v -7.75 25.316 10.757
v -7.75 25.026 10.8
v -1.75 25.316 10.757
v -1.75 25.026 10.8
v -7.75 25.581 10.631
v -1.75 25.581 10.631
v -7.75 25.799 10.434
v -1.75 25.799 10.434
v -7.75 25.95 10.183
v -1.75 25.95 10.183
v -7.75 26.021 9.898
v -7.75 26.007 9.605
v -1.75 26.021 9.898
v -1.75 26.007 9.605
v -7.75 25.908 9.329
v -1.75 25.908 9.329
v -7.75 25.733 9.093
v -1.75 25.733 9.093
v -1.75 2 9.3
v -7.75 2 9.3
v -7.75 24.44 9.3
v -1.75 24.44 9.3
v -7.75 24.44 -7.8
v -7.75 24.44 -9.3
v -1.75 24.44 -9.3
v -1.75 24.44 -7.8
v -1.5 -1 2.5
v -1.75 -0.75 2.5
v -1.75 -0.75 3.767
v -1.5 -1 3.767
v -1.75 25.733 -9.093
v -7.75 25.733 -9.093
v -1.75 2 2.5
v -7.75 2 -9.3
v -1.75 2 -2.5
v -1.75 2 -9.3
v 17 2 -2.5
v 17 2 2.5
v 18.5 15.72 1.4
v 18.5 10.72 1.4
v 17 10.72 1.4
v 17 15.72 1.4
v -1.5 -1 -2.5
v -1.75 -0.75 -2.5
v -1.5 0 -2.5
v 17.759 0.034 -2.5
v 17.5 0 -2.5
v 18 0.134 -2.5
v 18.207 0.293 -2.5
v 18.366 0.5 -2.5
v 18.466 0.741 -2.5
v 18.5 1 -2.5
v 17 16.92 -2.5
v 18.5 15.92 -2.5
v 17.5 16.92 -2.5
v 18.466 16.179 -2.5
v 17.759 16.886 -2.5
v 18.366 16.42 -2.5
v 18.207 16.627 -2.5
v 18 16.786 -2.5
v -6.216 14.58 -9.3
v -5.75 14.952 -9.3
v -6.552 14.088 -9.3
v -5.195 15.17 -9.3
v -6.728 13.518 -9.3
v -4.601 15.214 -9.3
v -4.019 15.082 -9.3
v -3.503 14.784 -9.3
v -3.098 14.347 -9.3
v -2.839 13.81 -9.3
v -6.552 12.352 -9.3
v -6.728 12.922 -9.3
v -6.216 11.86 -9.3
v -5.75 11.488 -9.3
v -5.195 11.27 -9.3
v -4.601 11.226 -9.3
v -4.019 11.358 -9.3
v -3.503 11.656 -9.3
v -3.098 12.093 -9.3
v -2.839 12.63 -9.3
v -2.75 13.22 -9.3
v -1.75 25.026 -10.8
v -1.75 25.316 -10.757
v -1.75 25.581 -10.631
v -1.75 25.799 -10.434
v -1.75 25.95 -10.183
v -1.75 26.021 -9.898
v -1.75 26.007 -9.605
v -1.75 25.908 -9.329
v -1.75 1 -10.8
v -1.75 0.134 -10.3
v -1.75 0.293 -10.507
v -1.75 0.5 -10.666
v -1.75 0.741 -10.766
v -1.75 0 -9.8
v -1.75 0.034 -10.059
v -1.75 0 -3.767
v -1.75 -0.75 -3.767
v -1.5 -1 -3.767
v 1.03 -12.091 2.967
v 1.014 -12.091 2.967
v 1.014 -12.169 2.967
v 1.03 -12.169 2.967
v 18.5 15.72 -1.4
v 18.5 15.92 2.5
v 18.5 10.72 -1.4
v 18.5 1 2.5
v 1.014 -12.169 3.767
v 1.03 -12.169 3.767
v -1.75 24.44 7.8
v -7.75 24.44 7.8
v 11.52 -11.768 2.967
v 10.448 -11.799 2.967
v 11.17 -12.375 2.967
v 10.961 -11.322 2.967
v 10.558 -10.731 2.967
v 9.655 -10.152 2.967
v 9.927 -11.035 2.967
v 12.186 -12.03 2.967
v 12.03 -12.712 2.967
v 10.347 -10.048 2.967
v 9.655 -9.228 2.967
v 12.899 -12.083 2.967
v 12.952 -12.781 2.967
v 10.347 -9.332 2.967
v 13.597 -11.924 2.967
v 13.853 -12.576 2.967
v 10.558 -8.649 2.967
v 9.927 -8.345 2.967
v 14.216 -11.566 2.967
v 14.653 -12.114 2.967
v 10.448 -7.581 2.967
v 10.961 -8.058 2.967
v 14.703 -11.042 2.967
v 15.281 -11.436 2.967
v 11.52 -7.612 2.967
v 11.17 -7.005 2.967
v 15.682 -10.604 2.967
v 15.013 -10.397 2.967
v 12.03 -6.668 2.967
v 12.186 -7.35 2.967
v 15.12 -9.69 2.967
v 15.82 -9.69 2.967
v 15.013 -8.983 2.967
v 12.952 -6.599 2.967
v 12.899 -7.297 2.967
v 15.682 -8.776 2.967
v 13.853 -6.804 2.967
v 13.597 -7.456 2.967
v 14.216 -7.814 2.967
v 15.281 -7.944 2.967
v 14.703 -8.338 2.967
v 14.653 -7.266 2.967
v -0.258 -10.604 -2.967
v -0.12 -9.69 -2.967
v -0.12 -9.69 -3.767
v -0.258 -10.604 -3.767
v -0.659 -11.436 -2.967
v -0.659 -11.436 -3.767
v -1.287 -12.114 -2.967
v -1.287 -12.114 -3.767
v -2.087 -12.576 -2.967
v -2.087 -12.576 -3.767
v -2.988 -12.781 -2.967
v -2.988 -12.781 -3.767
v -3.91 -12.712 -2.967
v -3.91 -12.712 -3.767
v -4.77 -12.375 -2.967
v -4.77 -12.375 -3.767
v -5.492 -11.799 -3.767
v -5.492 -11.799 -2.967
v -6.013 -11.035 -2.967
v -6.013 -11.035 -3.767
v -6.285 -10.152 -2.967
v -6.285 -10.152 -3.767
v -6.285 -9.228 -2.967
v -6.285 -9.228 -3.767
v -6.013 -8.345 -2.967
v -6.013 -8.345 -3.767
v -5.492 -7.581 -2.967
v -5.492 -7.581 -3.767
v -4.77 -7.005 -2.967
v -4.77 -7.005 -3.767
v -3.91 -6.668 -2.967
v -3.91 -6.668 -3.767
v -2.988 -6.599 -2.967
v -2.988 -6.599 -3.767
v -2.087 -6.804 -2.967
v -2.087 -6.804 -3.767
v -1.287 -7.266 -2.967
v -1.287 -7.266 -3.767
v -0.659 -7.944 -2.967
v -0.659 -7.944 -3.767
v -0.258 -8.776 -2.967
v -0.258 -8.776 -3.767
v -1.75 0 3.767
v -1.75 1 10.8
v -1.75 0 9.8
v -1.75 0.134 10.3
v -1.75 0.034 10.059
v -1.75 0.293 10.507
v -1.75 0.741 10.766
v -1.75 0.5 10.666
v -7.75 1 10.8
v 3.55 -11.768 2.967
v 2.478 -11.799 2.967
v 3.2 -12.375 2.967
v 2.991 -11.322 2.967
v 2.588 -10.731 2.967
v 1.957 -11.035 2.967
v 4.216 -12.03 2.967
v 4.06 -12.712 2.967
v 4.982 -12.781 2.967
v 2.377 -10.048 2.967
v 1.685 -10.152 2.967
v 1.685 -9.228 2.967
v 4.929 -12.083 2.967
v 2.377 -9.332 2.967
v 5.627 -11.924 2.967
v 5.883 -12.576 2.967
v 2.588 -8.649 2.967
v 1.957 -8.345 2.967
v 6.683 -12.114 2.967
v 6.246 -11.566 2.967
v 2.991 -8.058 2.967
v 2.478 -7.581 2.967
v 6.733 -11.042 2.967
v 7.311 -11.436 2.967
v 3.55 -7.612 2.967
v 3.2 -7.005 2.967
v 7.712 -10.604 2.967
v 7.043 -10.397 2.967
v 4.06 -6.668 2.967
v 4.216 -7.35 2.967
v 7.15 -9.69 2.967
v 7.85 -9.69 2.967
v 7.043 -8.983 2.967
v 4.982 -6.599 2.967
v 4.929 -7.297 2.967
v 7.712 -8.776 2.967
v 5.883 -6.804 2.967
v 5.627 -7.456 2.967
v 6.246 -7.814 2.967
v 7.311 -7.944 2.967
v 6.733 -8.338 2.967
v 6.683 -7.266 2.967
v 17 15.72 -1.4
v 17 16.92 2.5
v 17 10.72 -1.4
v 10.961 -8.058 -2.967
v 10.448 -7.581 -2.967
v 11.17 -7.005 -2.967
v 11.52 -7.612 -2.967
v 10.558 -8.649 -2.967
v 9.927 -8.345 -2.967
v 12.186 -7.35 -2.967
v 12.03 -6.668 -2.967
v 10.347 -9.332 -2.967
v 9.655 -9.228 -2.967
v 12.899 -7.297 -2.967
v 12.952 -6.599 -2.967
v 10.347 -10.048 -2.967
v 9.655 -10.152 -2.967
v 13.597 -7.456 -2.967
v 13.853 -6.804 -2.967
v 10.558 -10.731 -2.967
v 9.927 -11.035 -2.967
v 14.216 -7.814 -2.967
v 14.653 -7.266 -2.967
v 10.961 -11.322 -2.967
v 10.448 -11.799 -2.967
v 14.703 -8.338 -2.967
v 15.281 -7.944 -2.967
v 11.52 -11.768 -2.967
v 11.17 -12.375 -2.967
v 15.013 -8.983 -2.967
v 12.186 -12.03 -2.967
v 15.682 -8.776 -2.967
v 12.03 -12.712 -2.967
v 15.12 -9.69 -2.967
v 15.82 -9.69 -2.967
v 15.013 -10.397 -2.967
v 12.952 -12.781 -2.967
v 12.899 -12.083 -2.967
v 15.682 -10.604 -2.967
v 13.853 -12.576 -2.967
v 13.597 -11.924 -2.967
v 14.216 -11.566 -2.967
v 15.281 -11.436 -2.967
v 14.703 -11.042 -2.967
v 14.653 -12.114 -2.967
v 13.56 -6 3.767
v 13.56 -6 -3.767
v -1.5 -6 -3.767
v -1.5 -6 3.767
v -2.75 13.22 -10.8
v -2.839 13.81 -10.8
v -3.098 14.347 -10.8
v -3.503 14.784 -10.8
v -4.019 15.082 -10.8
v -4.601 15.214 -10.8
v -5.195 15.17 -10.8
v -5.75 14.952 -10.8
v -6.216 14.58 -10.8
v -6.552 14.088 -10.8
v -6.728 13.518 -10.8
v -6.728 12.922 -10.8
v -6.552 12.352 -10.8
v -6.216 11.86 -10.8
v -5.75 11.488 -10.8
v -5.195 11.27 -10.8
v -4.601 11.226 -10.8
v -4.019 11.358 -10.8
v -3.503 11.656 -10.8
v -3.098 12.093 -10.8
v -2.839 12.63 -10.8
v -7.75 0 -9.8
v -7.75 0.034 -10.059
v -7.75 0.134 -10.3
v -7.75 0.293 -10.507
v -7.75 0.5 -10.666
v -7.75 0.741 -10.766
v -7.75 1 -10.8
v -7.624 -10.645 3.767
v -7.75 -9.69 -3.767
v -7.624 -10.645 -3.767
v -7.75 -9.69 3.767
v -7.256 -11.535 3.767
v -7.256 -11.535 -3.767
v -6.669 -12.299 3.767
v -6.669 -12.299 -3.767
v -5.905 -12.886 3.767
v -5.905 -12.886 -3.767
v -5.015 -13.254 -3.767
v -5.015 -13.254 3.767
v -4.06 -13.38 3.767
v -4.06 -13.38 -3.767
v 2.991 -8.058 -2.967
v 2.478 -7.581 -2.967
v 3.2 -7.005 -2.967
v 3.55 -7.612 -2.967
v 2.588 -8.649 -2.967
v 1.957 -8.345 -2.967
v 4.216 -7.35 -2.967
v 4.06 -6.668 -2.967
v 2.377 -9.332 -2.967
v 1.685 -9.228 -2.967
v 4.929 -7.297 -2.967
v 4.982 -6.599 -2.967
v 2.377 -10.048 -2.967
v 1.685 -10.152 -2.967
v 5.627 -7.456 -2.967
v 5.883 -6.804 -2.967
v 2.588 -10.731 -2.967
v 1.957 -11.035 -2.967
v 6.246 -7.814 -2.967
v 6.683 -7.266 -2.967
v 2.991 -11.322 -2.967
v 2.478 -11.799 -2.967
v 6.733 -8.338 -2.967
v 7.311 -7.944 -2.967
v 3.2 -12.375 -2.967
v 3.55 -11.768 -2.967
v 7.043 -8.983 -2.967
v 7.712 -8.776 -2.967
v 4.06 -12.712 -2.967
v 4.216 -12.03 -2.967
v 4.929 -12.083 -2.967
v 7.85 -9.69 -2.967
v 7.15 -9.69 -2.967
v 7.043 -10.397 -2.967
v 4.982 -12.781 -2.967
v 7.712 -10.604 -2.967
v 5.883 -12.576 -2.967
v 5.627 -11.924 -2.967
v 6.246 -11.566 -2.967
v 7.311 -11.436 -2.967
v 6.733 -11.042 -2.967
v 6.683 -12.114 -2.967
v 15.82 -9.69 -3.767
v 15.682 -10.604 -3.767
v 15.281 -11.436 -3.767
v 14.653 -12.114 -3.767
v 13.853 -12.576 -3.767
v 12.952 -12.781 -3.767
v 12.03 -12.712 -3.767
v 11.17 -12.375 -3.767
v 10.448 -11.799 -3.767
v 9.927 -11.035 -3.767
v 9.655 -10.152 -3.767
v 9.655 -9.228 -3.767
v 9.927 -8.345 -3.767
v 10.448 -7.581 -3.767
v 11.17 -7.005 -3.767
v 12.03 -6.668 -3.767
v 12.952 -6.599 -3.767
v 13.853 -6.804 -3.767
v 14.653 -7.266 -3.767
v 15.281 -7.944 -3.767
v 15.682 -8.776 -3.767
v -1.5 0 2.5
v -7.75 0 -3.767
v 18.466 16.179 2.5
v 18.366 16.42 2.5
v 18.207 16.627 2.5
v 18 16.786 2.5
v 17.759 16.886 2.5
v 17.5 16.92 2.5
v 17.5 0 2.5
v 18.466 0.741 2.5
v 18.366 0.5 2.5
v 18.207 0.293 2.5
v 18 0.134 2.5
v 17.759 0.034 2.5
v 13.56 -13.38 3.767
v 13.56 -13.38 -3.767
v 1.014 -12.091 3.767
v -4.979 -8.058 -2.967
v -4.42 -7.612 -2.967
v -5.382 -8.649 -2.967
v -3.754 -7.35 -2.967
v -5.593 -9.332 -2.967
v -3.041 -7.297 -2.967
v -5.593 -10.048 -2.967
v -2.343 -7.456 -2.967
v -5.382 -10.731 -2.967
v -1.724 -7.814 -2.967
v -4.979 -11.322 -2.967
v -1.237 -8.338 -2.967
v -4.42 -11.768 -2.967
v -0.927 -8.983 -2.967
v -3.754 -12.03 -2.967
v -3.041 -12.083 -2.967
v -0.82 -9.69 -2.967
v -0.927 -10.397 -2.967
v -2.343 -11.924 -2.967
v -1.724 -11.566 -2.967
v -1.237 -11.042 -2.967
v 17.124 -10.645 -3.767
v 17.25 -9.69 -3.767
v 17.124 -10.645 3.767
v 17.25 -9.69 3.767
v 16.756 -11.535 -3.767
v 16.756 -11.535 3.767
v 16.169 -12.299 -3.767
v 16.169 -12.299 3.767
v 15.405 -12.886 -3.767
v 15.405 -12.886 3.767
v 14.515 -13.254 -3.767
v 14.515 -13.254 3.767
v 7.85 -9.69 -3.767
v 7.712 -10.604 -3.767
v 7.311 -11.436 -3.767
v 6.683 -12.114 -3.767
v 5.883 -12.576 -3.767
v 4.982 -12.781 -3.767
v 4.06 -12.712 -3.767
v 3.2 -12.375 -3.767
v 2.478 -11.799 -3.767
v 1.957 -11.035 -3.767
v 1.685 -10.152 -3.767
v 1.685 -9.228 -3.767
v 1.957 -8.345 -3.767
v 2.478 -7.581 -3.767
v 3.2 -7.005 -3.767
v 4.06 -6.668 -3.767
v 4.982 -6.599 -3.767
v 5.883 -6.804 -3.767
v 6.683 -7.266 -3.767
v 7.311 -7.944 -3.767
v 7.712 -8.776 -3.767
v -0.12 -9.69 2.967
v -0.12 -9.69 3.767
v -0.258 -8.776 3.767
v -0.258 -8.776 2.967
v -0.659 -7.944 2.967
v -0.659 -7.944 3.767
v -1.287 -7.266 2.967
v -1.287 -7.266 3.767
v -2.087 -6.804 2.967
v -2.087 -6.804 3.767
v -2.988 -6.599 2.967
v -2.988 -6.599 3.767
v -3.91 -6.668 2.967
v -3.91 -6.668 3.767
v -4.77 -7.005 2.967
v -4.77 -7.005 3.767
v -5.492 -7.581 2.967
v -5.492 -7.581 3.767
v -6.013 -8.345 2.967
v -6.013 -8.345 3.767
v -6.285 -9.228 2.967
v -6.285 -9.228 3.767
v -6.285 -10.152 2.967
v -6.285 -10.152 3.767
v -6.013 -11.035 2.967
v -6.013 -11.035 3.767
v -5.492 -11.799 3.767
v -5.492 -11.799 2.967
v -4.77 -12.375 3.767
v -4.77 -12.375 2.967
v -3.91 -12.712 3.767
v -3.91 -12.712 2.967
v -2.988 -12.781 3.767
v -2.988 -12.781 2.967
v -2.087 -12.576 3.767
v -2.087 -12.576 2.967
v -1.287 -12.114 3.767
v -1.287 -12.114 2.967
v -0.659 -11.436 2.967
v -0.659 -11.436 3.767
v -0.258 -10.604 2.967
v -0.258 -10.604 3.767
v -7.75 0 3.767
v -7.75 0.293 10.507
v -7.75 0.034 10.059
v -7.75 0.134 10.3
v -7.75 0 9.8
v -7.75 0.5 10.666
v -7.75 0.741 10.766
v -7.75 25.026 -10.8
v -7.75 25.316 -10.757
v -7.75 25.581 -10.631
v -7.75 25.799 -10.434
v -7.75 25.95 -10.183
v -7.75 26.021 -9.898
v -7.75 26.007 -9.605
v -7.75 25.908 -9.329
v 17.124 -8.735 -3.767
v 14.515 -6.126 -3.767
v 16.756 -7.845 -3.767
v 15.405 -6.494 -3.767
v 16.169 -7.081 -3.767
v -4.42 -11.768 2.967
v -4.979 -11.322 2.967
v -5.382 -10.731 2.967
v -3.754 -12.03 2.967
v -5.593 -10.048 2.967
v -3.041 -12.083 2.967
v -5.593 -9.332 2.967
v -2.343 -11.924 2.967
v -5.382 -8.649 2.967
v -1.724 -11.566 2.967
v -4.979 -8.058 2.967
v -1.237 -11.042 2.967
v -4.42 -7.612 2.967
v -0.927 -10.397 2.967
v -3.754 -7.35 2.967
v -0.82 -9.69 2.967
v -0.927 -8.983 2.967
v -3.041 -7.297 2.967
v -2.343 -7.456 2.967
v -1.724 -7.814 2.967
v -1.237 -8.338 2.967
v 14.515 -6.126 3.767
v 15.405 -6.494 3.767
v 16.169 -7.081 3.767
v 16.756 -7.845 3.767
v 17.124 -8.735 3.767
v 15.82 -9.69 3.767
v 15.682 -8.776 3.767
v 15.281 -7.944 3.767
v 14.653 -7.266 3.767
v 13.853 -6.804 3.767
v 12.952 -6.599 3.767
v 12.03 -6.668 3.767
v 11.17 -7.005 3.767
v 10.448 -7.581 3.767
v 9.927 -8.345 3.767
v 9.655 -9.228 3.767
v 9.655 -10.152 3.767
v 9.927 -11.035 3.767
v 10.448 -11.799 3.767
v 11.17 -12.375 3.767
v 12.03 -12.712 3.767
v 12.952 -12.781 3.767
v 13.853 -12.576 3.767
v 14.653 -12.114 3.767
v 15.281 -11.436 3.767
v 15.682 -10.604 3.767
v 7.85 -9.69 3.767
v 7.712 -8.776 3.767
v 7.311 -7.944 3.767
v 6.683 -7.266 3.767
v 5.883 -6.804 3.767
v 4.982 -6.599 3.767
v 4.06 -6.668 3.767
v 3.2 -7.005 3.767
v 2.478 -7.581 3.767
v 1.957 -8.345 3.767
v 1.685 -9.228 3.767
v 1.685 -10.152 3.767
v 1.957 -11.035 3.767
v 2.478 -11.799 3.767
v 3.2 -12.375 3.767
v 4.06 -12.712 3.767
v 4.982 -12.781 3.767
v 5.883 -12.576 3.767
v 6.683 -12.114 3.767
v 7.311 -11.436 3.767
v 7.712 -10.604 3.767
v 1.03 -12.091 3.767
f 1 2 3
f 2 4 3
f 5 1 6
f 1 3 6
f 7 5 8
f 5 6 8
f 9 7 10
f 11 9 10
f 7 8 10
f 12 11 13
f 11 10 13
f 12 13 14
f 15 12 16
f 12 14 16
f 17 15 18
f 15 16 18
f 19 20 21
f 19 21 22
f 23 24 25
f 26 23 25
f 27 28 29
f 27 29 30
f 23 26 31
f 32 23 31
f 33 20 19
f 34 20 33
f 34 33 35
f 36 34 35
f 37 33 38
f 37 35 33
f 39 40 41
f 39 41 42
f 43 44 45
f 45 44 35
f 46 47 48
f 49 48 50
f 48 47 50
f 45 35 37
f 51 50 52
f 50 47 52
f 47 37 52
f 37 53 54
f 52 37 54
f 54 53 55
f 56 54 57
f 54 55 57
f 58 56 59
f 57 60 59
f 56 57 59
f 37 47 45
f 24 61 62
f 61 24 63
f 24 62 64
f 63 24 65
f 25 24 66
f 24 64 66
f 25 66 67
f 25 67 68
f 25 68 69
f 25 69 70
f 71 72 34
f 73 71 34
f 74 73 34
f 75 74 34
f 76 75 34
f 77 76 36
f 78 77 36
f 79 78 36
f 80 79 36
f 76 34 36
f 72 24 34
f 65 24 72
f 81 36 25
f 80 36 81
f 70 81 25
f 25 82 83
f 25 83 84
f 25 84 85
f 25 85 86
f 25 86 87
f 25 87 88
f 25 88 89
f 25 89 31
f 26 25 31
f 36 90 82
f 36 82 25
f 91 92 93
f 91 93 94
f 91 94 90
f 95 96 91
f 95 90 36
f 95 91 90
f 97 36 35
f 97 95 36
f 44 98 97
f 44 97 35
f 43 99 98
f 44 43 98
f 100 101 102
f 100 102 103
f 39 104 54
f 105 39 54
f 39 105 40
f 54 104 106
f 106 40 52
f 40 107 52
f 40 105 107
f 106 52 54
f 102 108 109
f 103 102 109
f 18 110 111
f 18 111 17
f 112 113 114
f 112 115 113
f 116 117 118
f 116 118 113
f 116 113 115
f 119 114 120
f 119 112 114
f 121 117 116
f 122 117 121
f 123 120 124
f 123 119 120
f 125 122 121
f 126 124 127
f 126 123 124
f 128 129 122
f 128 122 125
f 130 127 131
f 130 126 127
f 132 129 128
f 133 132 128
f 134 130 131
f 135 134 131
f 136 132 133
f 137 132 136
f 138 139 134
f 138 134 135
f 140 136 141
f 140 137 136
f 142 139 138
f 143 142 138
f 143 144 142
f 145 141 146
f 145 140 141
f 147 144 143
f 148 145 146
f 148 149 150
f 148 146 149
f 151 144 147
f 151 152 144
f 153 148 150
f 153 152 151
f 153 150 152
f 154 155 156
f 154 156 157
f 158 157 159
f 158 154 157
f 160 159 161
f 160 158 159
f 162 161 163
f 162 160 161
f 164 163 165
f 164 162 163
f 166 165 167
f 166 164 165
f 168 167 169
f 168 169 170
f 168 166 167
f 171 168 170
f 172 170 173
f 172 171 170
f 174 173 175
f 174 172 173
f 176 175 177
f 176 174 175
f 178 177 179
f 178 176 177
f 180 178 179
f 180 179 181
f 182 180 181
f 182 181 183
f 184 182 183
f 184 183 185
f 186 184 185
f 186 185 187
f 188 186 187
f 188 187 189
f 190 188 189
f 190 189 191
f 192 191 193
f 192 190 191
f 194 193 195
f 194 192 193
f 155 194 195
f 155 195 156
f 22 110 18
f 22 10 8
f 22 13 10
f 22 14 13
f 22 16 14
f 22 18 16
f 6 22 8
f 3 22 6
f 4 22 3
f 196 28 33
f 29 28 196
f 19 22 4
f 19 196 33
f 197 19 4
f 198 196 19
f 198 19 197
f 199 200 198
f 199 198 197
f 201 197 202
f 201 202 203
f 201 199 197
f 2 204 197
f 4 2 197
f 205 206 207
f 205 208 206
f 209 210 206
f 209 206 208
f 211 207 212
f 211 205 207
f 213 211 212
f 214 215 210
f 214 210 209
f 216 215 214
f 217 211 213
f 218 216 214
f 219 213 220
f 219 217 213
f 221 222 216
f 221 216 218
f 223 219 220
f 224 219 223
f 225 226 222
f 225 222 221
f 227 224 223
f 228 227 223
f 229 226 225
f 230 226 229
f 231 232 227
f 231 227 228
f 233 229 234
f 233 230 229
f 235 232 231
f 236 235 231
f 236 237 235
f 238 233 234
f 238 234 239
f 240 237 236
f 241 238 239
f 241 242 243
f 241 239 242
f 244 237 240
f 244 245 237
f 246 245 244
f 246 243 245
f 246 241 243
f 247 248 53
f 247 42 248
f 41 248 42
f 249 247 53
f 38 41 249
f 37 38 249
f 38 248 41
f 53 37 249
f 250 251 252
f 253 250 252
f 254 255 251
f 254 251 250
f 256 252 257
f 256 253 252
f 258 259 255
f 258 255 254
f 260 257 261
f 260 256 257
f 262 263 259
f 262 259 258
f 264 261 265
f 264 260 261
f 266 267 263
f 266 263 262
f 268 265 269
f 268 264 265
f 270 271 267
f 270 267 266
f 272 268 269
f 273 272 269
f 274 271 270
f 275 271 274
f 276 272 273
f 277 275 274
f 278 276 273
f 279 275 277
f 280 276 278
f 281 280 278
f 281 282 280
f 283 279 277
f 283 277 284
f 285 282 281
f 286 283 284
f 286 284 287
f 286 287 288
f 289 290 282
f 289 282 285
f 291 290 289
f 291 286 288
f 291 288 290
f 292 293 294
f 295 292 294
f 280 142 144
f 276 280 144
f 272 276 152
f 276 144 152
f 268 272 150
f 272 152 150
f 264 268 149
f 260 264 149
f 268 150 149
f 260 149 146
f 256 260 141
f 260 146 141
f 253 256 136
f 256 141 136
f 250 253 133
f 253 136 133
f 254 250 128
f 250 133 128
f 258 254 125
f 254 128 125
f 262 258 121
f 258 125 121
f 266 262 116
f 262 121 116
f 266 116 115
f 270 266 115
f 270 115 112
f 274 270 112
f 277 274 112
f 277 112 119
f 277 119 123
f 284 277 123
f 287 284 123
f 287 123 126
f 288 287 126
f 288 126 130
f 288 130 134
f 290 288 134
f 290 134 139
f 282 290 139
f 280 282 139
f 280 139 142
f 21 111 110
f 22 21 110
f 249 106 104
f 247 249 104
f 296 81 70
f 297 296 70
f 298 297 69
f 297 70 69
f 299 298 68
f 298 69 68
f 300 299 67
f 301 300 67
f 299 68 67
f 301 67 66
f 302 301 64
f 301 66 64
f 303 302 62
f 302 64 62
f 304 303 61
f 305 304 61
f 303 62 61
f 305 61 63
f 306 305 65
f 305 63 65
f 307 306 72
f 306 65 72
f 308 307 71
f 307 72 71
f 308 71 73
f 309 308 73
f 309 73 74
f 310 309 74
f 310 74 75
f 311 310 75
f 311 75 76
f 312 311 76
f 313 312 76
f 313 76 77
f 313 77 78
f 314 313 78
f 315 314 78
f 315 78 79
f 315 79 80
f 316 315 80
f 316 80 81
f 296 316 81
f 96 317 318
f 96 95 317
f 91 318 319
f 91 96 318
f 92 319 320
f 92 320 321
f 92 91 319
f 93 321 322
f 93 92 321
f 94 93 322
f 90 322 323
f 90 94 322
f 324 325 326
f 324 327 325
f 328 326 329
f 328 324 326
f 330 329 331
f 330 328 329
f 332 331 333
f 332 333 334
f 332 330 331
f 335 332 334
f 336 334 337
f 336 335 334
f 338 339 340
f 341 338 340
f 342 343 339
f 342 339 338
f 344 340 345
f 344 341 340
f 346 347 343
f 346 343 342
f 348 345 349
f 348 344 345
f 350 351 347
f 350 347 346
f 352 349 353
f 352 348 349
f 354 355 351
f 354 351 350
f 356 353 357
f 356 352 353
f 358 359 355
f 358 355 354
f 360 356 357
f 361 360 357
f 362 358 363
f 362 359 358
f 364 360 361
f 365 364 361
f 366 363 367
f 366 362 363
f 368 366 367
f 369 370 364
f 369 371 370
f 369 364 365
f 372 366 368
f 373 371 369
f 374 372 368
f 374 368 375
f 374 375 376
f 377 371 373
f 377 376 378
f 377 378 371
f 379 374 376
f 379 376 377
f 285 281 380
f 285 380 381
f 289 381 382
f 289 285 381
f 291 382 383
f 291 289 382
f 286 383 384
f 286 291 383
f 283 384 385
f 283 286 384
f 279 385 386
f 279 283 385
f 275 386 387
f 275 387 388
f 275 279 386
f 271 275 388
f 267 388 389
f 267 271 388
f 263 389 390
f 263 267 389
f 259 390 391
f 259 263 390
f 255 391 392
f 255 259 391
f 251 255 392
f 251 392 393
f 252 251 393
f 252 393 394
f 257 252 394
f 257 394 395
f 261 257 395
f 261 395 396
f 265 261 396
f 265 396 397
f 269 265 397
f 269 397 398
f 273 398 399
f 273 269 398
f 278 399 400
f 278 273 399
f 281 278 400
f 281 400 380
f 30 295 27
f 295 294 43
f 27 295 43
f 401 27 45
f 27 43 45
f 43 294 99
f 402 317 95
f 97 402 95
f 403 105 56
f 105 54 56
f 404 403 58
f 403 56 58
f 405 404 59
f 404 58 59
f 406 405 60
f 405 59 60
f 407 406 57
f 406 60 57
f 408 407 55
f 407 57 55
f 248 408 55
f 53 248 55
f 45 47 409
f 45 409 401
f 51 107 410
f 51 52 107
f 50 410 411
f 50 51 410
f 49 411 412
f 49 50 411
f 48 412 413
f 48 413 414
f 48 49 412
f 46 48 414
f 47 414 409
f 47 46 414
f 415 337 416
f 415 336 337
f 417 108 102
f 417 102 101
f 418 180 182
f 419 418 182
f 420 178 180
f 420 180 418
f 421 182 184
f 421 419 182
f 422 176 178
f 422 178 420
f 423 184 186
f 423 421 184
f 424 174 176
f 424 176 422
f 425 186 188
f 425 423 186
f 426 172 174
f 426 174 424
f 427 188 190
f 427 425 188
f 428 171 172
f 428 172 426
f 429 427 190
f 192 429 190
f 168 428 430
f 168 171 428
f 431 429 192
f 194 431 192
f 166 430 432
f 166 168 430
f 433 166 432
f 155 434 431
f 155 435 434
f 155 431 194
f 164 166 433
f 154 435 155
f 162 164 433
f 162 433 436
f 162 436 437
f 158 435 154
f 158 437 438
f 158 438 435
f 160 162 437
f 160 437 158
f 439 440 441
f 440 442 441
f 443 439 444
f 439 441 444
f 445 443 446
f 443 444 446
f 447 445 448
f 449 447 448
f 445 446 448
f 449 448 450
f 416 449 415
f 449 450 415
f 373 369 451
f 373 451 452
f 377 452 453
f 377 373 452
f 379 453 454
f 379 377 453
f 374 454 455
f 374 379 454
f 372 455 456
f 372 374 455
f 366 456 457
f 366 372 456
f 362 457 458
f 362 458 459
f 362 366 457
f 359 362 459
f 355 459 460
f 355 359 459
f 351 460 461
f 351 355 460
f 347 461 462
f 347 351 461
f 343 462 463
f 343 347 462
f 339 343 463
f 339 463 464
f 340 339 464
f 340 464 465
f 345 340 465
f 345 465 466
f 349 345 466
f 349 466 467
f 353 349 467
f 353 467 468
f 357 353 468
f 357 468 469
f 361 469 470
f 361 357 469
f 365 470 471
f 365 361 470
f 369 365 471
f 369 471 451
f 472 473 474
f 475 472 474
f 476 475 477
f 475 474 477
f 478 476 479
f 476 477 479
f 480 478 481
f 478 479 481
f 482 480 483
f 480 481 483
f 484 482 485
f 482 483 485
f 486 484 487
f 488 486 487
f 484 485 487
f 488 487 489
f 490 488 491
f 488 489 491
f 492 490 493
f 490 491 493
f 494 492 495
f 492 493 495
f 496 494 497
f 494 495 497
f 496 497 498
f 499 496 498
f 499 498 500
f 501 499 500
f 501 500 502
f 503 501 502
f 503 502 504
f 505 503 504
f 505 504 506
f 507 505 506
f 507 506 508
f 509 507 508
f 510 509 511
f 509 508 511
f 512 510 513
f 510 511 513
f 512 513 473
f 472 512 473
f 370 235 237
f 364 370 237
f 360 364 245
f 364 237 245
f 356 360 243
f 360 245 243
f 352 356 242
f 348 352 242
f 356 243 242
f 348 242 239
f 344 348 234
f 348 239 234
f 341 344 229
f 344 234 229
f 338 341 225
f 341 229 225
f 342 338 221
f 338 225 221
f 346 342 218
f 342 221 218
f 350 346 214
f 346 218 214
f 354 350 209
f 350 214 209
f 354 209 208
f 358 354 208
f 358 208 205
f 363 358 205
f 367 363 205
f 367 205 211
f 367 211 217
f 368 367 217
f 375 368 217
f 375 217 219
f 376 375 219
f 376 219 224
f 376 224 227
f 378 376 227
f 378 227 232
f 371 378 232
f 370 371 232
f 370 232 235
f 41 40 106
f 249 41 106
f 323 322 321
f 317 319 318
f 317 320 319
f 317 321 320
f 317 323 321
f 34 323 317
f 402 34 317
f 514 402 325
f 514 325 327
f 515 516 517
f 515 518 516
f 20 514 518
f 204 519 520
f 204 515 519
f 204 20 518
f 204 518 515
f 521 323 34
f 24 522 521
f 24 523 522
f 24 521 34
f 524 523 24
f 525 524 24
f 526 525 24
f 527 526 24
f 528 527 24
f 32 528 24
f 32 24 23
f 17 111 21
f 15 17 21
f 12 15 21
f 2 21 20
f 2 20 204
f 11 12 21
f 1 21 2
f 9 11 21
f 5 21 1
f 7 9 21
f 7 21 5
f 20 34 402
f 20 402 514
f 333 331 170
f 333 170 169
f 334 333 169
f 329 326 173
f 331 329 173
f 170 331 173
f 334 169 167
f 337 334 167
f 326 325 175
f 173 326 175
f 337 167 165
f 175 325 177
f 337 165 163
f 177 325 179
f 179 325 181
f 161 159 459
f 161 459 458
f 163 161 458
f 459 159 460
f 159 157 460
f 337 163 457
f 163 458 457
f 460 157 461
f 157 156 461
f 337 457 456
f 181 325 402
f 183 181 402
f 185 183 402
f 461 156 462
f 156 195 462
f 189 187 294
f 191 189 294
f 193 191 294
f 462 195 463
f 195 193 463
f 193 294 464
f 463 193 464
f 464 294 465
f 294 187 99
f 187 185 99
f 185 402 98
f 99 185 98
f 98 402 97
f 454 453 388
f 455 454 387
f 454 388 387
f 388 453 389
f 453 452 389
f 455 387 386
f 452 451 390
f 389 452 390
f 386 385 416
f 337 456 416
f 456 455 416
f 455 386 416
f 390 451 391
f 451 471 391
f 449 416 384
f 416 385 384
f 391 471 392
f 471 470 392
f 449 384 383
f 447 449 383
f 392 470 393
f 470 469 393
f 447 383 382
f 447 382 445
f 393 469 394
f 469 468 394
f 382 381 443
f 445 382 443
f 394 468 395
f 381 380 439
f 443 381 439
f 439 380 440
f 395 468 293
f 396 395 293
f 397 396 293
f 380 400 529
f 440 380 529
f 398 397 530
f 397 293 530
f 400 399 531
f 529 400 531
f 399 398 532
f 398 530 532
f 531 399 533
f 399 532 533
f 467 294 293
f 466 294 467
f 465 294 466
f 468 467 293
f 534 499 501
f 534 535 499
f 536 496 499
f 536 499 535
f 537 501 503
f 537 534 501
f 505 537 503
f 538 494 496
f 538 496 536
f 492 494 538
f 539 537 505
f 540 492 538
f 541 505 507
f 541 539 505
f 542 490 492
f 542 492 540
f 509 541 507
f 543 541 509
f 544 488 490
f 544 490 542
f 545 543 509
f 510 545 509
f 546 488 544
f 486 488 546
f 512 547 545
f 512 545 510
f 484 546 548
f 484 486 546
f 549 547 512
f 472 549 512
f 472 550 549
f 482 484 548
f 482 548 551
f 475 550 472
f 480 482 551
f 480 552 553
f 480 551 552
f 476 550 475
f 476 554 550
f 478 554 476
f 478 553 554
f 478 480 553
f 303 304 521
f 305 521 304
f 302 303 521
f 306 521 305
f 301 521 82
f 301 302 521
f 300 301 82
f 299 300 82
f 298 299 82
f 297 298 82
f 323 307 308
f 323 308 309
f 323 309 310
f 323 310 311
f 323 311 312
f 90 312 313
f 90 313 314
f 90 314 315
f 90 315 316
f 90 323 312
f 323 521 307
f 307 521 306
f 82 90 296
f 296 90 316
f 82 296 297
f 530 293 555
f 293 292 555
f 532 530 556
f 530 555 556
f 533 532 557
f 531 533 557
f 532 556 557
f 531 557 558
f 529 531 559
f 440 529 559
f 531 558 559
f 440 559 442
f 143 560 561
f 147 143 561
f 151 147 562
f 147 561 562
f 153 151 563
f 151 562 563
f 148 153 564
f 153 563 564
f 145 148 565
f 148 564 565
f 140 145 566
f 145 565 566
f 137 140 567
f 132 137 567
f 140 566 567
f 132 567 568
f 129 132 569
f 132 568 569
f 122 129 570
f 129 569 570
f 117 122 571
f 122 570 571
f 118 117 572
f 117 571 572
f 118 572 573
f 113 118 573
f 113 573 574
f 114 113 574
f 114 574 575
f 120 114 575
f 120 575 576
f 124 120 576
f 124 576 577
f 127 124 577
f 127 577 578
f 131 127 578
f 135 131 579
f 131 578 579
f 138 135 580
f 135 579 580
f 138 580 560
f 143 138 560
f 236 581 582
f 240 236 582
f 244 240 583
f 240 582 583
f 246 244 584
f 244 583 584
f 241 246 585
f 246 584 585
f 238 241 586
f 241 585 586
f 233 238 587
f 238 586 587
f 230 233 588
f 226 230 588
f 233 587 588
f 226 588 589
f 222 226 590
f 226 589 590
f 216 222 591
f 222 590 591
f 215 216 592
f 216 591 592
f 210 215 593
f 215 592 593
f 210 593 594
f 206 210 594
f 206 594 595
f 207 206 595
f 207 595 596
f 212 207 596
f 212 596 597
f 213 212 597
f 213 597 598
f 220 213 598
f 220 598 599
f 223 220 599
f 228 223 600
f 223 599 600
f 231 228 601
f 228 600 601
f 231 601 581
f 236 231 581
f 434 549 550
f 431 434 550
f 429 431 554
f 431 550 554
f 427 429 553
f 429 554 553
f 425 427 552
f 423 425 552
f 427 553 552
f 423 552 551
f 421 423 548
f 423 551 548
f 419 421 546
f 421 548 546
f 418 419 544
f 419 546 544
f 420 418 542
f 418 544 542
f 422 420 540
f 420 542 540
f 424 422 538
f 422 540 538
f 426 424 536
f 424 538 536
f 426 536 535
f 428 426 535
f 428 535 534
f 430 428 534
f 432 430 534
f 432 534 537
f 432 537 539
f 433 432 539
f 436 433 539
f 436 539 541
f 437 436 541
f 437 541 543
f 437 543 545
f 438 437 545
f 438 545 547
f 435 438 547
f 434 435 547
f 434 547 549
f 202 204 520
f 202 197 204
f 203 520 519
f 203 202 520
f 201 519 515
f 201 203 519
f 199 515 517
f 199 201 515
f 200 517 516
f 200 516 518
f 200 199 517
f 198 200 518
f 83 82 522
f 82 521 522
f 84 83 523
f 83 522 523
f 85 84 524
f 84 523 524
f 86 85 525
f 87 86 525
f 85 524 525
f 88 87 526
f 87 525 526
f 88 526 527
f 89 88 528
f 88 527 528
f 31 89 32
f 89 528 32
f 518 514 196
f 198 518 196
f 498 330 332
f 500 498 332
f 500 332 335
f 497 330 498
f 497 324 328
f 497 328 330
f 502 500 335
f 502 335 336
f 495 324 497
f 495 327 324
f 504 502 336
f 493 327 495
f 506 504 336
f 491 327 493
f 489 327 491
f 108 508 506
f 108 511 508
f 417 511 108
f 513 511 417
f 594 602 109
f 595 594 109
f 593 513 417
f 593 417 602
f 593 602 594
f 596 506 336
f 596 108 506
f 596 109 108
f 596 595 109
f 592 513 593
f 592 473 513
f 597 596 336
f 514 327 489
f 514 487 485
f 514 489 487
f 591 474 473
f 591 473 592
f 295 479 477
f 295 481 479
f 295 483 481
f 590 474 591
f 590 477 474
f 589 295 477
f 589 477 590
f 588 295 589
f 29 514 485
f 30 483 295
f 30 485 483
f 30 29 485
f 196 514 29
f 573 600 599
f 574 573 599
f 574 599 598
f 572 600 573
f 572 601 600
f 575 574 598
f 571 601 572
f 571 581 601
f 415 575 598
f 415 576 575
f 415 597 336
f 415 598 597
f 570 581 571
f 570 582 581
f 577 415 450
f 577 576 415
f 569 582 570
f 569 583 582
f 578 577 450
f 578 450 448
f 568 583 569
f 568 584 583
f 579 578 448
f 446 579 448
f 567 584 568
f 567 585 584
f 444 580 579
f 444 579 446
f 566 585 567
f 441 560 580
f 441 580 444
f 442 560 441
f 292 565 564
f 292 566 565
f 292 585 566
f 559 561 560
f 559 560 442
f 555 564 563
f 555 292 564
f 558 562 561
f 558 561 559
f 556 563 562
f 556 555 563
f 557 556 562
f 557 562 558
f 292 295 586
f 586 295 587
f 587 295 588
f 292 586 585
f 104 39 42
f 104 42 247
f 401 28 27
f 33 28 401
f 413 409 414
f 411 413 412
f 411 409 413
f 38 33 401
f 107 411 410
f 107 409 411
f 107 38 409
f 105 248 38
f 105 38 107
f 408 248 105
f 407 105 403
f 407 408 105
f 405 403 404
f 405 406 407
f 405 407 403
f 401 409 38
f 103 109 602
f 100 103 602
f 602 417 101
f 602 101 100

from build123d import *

# Parameters (mm, degrees)
SKETCH1_W           = 37
SKETCH1_H           = 21.6
BOSS_EXTRUDE1_DEPTH = 2
SKETCH2_W           = 6
SKETCH2_H           = 1.5
SKETCH2_W_2         = 1.5
SKETCH2_H_2         = 5
BOSS_EXTRUDE2_DEPTH = 22.44
SKETCH3_W           = 6
SKETCH3_H           = 3
BOSS_EXTRUDE3_DEPTH = 5
CHAMFER1_SIZE       = 5
SKETCH4_W           = 6
SKETCH4_H           = 3
BOSS_EXTRUDE4_DEPTH = 5
CHAMFER2_SIZE       = 5
SKETCH6_W           = 5
SKETCH6_H           = 7.52
SKETCH6_W_2         = 2.8
SKETCH6_H_2         = 5
CUT_EXTRUDE1_DEPTH  = 5
SKETCH8_W           = 20.25
SKETCH8_H           = 8.3
SKETCH8_W_2         = 10.75
SKETCH8_H_2         = 21.6
CUT_EXTRUDE3_DEPTH  = 10
FILLET1_R           = 1
FILLET2_R           = 1
SKETCH9_R           = 2
CUT_EXTRUDE4_DEPTH  = 10
SKETCH13_W          = 25
SKETCH13_H          = 7.533980582
BOSS_EXTRUDE5_DEPTH = 13.38
SKETCH14_R          = 2.4
CUT_EXTRUDE5_DEPTH  = 7.92
SKETCH15_R          = 3.1
SKETCH15_W          = 0.016515358
SKETCH15_H          = 0.077878544
CUT_EXTRUDE6_DEPTH  = 0.8
CUT_EXTRUDE7_START  = -0.8
SKETCH16_R          = 3.1
CUT_EXTRUDE7_DEPTH  = 0.8
SKETCH19_W          = 18.75
SKETCH19_H          = 6
CUT_EXTRUDE8_DEPTH  = 10
FILLET3_R           = 3.69
CHAMFER3_SIZE       = 1
CHAMFER4_SIZE       = 1


# Some blends are built 0.0001 mm under size
with BuildPart() as part:
    # Sketch1 → Boss-Extrude1 (new body)
    with BuildSketch(Plane(origin=(0, 0, 0), x_dir=(1, 0, 0), z_dir=(0, 1, 0))):
        Rectangle(SKETCH1_W, SKETCH1_H)
    extrude(amount=BOSS_EXTRUDE1_DEPTH)

    # Sketch2 → Boss-Extrude2 (add)
    with BuildSketch(Plane(origin=(0, 2, 0), x_dir=(1, 0, 0), z_dir=(0, 1, 0))):
        with Locations((-4.75, 10.05)):
            Rectangle(SKETCH2_W, SKETCH2_H)
        with Locations((-4.75, -10.05)):
            Rectangle(SKETCH2_W, SKETCH2_H)
        with Locations((17.75, 0)):
            Rectangle(SKETCH2_W_2, SKETCH2_H_2)
    extrude(amount=BOSS_EXTRUDE2_DEPTH)

    # Sketch3 → Boss-Extrude3 (add)
    with BuildSketch(Plane(origin=(0, 24.44, 0), x_dir=(1, 0, 0), z_dir=(0, 1, 0))):
        with Locations((-4.75, 9.3)):
            Rectangle(SKETCH3_W, SKETCH3_H)
    extrude(amount=BOSS_EXTRUDE3_DEPTH)

    # Chamfer1
    # the kernel refuses this chamfer: 5 mm, written as the material it takes off along each edge
    with BuildSketch(Plane(origin=(11.10841494, 29.44, -7.8), x_dir=(0, -0.9996219169112968, 0.027495876610586317), z_dir=(-1, 0, 0))) as chamfer1_piece_1:
        Polygon((CHAMFER1_SIZE * 0.999621916911, -CHAMFER1_SIZE * 0.0274958766106), (-CHAMFER1_SIZE * 0.0274958766106, -CHAMFER1_SIZE * 0.999621916911), (0, 0), align=None)
    extrude(amount=31.71682988, mode=Mode.SUBTRACT)

    # Sketch4 → Boss-Extrude4 (add)
    with BuildSketch(Plane(origin=(0, 24.44, 0), x_dir=(1, 0, 0), z_dir=(0, 1, 0))):
        with Locations((-4.75, -9.3)):
            Rectangle(SKETCH4_W, SKETCH4_H)
    extrude(amount=BOSS_EXTRUDE4_DEPTH)

    # Chamfer2
    # the kernel refuses this chamfer: 5 mm, written as the material it takes off along each edge
    with BuildSketch(Plane(origin=(11.10841494, 29.44, 7.8), x_dir=(0, -0.9996219169112968, -0.027495876610586317), z_dir=(-1, 0, 0))) as chamfer2_piece_1:
        Polygon((CHAMFER2_SIZE * 0.999621916911, CHAMFER2_SIZE * 0.0274958766106), (-CHAMFER2_SIZE * 0.0274958766106, CHAMFER2_SIZE * 0.999621916911), (0, 0), align=None)
    extrude(amount=31.71682988, mode=Mode.SUBTRACT)

    # Sketch6 → Cut-Extrude1 (cut)
    with BuildSketch(Plane(origin=(18.5, 0, 0), x_dir=(0, 0, -1), z_dir=(1, 0, 0))):
        with Locations((0, 20.68)):
            Rectangle(SKETCH6_W, SKETCH6_H)
        with Locations((0, 13.22)):
            Rectangle(SKETCH6_W_2, SKETCH6_H_2)
    extrude(amount=-CUT_EXTRUDE1_DEPTH, mode=Mode.SUBTRACT)

    # Sketch8 → Cut-Extrude3 (cut)
    with BuildSketch(Plane(origin=(0, 2, 0), x_dir=(1, 0, 0), z_dir=(0, 1, 0))):
        with Locations((8.375, 6.65)):
            Rectangle(SKETCH8_W, SKETCH8_H)
        with Locations((8.375, -6.65)):
            Rectangle(SKETCH8_W, SKETCH8_H)
        with Locations((-13.125, 0)):
            Rectangle(SKETCH8_W_2, SKETCH8_H_2)
    extrude(amount=-CUT_EXTRUDE3_DEPTH, mode=Mode.SUBTRACT)

    # Fillet1
    fillet1_edges = [part.edges().sort_by_distance(p)[0] for p in [
        (-4.75, 0, -10.8),
        (18.5, 0, 0),
        (-4.75, 0, 10.8),
        (-4.75, 27.44, -10.8),
        (-4.75, 27.44, 10.8),
    ]]
    fillet(fillet1_edges, radius=FILLET1_R)

    # Fillet2
    fillet2_edges = [part.edges().sort_by_distance(p)[0] for p in [
        (18.5, 16.92, 0),
    ]]
    fillet(fillet2_edges, radius=FILLET2_R)

    # Sketch9 → Cut-Extrude4 (cut)
    with BuildSketch(Plane.XY.offset(-9.3)):
        with Locations((-4.75, 13.22)):
            Circle(SKETCH9_R)
    extrude(amount=-CUT_EXTRUDE4_DEPTH, mode=Mode.SUBTRACT)

    # Sketch13 → Boss-Extrude5 (add)
    with BuildSketch(Plane.XZ):
        with Locations((4.75, 0)):
            Rectangle(SKETCH13_W, SKETCH13_H)
    extrude(amount=BOSS_EXTRUDE5_DEPTH)

    # Sketch14 → Cut-Extrude5 (cut)
    with BuildSketch(Plane.XY.offset(3.766990291)):
        with Locations((4.75, -9.69)):
            Circle(SKETCH14_R)
        with Locations((12.72, -9.69)):
            Circle(SKETCH14_R)
        with Locations((-3.22, -9.69)):
            Circle(SKETCH14_R)
    extrude(amount=-CUT_EXTRUDE5_DEPTH, mode=Mode.SUBTRACT)

    # Sketch15 → Cut-Extrude6 (cut)
    with BuildSketch(Plane.XY.offset(3.766990291)):
        with Locations((-3.22, -9.69)):
            Circle(SKETCH15_R)
        with Locations((4.75, -9.69)):
            Circle(SKETCH15_R)
        with Locations((12.72, -9.69)):
            Circle(SKETCH15_R)
        with Locations((1.021954756, -12.130200689)):
            Rectangle(SKETCH15_W, SKETCH15_H)
    extrude(amount=-CUT_EXTRUDE6_DEPTH, mode=Mode.SUBTRACT)

    # Sketch16 → Cut-Extrude7 (cut)
    with BuildSketch(Plane(origin=(0, 0, -3.766990291), x_dir=(-1, 0, 0), z_dir=(0, 0, -1)).offset(CUT_EXTRUDE7_START)):
        with Locations(Location((-4.75, -9.69, 0), (0, 0, 180))):
            Circle(SKETCH16_R)
        with Locations(Location((3.22, -9.69, 0), (0, 0, 180))):
            Circle(SKETCH16_R)
        with Locations(Location((-12.72, -9.69, 0), (0, 0, 180))):
            Circle(SKETCH16_R)
    extrude(amount=CUT_EXTRUDE7_DEPTH, mode=Mode.SUBTRACT)

    # Sketch19 → Cut-Extrude8 (cut)
    with BuildSketch(Plane(origin=(0, 0, -3.766990291), x_dir=(-1, 0, 0), z_dir=(0, 0, -1))):
        with Locations((-7.875, -3)):
            Rectangle(SKETCH19_W, SKETCH19_H)
    extrude(amount=-CUT_EXTRUDE8_DEPTH, mode=Mode.SUBTRACT)

    # Fillet3
    fillet3_edges = [part.edges().sort_by_distance(p)[0] for p in [
        (-7.75, -13.38, 0),
        (17.25, -13.38, 0),
        (17.25, -6, 0),
    ]]
    fillet(fillet3_edges, radius=FILLET3_R - 0.0001)  # a hair under: the kernel refuses the full size

    # Chamfer3
    # the kernel refuses this chamfer: 1 mm, written as the material it takes off along each edge
    with BuildSketch(Plane(origin=(-1.5, 0, -6.338673279), x_dir=(0.027495876610586275, -0.9996219169112968, 0), z_dir=(0, 0, 1))) as chamfer3_piece_1_section:
        Polygon((CHAMFER3_SIZE * 0.999621916911, -CHAMFER3_SIZE * 0.0274958766106), (-CHAMFER3_SIZE * 0.0274958766106, -CHAMFER3_SIZE * 0.999621916911), (0, 0), align=None)
    chamfer3_piece_1 = extrude(amount=3.838673279, mode=Mode.PRIVATE)
    chamfer3_piece_1 = split(chamfer3_piece_1, bisect_by=Plane(origin=(-1.75, -0.44047619, -3.133495146), z_dir=(1, 0, 0)), keep=Keep.TOP, mode=Mode.PRIVATE)
    add(chamfer3_piece_1, mode=Mode.SUBTRACT)

    # Chamfer4
    # the kernel refuses this chamfer: 1 mm, written as the material it takes off along each edge
    with BuildSketch(Plane(origin=(-1.5, 0, 2.5), x_dir=(-0.9996219169112968, 0.027495876610586358, 0), z_dir=(0, 0, 1))) as chamfer4_piece_1_section:
        Polygon((CHAMFER4_SIZE * 0.999621916911, CHAMFER4_SIZE * 0.0274958766106), (-CHAMFER4_SIZE * 0.0274958766106, CHAMFER4_SIZE * 0.999621916911), (0, 0), align=None)
    chamfer4_piece_1 = extrude(amount=3.838673279, mode=Mode.PRIVATE)
    chamfer4_piece_1 = split(chamfer4_piece_1, bisect_by=Plane(origin=(-1.75, -0.44047619, 3.133495146), z_dir=(1, 0, 0)), keep=Keep.TOP, mode=Mode.PRIVATE)
    add(chamfer4_piece_1, mode=Mode.SUBTRACT)


solid = part.part
